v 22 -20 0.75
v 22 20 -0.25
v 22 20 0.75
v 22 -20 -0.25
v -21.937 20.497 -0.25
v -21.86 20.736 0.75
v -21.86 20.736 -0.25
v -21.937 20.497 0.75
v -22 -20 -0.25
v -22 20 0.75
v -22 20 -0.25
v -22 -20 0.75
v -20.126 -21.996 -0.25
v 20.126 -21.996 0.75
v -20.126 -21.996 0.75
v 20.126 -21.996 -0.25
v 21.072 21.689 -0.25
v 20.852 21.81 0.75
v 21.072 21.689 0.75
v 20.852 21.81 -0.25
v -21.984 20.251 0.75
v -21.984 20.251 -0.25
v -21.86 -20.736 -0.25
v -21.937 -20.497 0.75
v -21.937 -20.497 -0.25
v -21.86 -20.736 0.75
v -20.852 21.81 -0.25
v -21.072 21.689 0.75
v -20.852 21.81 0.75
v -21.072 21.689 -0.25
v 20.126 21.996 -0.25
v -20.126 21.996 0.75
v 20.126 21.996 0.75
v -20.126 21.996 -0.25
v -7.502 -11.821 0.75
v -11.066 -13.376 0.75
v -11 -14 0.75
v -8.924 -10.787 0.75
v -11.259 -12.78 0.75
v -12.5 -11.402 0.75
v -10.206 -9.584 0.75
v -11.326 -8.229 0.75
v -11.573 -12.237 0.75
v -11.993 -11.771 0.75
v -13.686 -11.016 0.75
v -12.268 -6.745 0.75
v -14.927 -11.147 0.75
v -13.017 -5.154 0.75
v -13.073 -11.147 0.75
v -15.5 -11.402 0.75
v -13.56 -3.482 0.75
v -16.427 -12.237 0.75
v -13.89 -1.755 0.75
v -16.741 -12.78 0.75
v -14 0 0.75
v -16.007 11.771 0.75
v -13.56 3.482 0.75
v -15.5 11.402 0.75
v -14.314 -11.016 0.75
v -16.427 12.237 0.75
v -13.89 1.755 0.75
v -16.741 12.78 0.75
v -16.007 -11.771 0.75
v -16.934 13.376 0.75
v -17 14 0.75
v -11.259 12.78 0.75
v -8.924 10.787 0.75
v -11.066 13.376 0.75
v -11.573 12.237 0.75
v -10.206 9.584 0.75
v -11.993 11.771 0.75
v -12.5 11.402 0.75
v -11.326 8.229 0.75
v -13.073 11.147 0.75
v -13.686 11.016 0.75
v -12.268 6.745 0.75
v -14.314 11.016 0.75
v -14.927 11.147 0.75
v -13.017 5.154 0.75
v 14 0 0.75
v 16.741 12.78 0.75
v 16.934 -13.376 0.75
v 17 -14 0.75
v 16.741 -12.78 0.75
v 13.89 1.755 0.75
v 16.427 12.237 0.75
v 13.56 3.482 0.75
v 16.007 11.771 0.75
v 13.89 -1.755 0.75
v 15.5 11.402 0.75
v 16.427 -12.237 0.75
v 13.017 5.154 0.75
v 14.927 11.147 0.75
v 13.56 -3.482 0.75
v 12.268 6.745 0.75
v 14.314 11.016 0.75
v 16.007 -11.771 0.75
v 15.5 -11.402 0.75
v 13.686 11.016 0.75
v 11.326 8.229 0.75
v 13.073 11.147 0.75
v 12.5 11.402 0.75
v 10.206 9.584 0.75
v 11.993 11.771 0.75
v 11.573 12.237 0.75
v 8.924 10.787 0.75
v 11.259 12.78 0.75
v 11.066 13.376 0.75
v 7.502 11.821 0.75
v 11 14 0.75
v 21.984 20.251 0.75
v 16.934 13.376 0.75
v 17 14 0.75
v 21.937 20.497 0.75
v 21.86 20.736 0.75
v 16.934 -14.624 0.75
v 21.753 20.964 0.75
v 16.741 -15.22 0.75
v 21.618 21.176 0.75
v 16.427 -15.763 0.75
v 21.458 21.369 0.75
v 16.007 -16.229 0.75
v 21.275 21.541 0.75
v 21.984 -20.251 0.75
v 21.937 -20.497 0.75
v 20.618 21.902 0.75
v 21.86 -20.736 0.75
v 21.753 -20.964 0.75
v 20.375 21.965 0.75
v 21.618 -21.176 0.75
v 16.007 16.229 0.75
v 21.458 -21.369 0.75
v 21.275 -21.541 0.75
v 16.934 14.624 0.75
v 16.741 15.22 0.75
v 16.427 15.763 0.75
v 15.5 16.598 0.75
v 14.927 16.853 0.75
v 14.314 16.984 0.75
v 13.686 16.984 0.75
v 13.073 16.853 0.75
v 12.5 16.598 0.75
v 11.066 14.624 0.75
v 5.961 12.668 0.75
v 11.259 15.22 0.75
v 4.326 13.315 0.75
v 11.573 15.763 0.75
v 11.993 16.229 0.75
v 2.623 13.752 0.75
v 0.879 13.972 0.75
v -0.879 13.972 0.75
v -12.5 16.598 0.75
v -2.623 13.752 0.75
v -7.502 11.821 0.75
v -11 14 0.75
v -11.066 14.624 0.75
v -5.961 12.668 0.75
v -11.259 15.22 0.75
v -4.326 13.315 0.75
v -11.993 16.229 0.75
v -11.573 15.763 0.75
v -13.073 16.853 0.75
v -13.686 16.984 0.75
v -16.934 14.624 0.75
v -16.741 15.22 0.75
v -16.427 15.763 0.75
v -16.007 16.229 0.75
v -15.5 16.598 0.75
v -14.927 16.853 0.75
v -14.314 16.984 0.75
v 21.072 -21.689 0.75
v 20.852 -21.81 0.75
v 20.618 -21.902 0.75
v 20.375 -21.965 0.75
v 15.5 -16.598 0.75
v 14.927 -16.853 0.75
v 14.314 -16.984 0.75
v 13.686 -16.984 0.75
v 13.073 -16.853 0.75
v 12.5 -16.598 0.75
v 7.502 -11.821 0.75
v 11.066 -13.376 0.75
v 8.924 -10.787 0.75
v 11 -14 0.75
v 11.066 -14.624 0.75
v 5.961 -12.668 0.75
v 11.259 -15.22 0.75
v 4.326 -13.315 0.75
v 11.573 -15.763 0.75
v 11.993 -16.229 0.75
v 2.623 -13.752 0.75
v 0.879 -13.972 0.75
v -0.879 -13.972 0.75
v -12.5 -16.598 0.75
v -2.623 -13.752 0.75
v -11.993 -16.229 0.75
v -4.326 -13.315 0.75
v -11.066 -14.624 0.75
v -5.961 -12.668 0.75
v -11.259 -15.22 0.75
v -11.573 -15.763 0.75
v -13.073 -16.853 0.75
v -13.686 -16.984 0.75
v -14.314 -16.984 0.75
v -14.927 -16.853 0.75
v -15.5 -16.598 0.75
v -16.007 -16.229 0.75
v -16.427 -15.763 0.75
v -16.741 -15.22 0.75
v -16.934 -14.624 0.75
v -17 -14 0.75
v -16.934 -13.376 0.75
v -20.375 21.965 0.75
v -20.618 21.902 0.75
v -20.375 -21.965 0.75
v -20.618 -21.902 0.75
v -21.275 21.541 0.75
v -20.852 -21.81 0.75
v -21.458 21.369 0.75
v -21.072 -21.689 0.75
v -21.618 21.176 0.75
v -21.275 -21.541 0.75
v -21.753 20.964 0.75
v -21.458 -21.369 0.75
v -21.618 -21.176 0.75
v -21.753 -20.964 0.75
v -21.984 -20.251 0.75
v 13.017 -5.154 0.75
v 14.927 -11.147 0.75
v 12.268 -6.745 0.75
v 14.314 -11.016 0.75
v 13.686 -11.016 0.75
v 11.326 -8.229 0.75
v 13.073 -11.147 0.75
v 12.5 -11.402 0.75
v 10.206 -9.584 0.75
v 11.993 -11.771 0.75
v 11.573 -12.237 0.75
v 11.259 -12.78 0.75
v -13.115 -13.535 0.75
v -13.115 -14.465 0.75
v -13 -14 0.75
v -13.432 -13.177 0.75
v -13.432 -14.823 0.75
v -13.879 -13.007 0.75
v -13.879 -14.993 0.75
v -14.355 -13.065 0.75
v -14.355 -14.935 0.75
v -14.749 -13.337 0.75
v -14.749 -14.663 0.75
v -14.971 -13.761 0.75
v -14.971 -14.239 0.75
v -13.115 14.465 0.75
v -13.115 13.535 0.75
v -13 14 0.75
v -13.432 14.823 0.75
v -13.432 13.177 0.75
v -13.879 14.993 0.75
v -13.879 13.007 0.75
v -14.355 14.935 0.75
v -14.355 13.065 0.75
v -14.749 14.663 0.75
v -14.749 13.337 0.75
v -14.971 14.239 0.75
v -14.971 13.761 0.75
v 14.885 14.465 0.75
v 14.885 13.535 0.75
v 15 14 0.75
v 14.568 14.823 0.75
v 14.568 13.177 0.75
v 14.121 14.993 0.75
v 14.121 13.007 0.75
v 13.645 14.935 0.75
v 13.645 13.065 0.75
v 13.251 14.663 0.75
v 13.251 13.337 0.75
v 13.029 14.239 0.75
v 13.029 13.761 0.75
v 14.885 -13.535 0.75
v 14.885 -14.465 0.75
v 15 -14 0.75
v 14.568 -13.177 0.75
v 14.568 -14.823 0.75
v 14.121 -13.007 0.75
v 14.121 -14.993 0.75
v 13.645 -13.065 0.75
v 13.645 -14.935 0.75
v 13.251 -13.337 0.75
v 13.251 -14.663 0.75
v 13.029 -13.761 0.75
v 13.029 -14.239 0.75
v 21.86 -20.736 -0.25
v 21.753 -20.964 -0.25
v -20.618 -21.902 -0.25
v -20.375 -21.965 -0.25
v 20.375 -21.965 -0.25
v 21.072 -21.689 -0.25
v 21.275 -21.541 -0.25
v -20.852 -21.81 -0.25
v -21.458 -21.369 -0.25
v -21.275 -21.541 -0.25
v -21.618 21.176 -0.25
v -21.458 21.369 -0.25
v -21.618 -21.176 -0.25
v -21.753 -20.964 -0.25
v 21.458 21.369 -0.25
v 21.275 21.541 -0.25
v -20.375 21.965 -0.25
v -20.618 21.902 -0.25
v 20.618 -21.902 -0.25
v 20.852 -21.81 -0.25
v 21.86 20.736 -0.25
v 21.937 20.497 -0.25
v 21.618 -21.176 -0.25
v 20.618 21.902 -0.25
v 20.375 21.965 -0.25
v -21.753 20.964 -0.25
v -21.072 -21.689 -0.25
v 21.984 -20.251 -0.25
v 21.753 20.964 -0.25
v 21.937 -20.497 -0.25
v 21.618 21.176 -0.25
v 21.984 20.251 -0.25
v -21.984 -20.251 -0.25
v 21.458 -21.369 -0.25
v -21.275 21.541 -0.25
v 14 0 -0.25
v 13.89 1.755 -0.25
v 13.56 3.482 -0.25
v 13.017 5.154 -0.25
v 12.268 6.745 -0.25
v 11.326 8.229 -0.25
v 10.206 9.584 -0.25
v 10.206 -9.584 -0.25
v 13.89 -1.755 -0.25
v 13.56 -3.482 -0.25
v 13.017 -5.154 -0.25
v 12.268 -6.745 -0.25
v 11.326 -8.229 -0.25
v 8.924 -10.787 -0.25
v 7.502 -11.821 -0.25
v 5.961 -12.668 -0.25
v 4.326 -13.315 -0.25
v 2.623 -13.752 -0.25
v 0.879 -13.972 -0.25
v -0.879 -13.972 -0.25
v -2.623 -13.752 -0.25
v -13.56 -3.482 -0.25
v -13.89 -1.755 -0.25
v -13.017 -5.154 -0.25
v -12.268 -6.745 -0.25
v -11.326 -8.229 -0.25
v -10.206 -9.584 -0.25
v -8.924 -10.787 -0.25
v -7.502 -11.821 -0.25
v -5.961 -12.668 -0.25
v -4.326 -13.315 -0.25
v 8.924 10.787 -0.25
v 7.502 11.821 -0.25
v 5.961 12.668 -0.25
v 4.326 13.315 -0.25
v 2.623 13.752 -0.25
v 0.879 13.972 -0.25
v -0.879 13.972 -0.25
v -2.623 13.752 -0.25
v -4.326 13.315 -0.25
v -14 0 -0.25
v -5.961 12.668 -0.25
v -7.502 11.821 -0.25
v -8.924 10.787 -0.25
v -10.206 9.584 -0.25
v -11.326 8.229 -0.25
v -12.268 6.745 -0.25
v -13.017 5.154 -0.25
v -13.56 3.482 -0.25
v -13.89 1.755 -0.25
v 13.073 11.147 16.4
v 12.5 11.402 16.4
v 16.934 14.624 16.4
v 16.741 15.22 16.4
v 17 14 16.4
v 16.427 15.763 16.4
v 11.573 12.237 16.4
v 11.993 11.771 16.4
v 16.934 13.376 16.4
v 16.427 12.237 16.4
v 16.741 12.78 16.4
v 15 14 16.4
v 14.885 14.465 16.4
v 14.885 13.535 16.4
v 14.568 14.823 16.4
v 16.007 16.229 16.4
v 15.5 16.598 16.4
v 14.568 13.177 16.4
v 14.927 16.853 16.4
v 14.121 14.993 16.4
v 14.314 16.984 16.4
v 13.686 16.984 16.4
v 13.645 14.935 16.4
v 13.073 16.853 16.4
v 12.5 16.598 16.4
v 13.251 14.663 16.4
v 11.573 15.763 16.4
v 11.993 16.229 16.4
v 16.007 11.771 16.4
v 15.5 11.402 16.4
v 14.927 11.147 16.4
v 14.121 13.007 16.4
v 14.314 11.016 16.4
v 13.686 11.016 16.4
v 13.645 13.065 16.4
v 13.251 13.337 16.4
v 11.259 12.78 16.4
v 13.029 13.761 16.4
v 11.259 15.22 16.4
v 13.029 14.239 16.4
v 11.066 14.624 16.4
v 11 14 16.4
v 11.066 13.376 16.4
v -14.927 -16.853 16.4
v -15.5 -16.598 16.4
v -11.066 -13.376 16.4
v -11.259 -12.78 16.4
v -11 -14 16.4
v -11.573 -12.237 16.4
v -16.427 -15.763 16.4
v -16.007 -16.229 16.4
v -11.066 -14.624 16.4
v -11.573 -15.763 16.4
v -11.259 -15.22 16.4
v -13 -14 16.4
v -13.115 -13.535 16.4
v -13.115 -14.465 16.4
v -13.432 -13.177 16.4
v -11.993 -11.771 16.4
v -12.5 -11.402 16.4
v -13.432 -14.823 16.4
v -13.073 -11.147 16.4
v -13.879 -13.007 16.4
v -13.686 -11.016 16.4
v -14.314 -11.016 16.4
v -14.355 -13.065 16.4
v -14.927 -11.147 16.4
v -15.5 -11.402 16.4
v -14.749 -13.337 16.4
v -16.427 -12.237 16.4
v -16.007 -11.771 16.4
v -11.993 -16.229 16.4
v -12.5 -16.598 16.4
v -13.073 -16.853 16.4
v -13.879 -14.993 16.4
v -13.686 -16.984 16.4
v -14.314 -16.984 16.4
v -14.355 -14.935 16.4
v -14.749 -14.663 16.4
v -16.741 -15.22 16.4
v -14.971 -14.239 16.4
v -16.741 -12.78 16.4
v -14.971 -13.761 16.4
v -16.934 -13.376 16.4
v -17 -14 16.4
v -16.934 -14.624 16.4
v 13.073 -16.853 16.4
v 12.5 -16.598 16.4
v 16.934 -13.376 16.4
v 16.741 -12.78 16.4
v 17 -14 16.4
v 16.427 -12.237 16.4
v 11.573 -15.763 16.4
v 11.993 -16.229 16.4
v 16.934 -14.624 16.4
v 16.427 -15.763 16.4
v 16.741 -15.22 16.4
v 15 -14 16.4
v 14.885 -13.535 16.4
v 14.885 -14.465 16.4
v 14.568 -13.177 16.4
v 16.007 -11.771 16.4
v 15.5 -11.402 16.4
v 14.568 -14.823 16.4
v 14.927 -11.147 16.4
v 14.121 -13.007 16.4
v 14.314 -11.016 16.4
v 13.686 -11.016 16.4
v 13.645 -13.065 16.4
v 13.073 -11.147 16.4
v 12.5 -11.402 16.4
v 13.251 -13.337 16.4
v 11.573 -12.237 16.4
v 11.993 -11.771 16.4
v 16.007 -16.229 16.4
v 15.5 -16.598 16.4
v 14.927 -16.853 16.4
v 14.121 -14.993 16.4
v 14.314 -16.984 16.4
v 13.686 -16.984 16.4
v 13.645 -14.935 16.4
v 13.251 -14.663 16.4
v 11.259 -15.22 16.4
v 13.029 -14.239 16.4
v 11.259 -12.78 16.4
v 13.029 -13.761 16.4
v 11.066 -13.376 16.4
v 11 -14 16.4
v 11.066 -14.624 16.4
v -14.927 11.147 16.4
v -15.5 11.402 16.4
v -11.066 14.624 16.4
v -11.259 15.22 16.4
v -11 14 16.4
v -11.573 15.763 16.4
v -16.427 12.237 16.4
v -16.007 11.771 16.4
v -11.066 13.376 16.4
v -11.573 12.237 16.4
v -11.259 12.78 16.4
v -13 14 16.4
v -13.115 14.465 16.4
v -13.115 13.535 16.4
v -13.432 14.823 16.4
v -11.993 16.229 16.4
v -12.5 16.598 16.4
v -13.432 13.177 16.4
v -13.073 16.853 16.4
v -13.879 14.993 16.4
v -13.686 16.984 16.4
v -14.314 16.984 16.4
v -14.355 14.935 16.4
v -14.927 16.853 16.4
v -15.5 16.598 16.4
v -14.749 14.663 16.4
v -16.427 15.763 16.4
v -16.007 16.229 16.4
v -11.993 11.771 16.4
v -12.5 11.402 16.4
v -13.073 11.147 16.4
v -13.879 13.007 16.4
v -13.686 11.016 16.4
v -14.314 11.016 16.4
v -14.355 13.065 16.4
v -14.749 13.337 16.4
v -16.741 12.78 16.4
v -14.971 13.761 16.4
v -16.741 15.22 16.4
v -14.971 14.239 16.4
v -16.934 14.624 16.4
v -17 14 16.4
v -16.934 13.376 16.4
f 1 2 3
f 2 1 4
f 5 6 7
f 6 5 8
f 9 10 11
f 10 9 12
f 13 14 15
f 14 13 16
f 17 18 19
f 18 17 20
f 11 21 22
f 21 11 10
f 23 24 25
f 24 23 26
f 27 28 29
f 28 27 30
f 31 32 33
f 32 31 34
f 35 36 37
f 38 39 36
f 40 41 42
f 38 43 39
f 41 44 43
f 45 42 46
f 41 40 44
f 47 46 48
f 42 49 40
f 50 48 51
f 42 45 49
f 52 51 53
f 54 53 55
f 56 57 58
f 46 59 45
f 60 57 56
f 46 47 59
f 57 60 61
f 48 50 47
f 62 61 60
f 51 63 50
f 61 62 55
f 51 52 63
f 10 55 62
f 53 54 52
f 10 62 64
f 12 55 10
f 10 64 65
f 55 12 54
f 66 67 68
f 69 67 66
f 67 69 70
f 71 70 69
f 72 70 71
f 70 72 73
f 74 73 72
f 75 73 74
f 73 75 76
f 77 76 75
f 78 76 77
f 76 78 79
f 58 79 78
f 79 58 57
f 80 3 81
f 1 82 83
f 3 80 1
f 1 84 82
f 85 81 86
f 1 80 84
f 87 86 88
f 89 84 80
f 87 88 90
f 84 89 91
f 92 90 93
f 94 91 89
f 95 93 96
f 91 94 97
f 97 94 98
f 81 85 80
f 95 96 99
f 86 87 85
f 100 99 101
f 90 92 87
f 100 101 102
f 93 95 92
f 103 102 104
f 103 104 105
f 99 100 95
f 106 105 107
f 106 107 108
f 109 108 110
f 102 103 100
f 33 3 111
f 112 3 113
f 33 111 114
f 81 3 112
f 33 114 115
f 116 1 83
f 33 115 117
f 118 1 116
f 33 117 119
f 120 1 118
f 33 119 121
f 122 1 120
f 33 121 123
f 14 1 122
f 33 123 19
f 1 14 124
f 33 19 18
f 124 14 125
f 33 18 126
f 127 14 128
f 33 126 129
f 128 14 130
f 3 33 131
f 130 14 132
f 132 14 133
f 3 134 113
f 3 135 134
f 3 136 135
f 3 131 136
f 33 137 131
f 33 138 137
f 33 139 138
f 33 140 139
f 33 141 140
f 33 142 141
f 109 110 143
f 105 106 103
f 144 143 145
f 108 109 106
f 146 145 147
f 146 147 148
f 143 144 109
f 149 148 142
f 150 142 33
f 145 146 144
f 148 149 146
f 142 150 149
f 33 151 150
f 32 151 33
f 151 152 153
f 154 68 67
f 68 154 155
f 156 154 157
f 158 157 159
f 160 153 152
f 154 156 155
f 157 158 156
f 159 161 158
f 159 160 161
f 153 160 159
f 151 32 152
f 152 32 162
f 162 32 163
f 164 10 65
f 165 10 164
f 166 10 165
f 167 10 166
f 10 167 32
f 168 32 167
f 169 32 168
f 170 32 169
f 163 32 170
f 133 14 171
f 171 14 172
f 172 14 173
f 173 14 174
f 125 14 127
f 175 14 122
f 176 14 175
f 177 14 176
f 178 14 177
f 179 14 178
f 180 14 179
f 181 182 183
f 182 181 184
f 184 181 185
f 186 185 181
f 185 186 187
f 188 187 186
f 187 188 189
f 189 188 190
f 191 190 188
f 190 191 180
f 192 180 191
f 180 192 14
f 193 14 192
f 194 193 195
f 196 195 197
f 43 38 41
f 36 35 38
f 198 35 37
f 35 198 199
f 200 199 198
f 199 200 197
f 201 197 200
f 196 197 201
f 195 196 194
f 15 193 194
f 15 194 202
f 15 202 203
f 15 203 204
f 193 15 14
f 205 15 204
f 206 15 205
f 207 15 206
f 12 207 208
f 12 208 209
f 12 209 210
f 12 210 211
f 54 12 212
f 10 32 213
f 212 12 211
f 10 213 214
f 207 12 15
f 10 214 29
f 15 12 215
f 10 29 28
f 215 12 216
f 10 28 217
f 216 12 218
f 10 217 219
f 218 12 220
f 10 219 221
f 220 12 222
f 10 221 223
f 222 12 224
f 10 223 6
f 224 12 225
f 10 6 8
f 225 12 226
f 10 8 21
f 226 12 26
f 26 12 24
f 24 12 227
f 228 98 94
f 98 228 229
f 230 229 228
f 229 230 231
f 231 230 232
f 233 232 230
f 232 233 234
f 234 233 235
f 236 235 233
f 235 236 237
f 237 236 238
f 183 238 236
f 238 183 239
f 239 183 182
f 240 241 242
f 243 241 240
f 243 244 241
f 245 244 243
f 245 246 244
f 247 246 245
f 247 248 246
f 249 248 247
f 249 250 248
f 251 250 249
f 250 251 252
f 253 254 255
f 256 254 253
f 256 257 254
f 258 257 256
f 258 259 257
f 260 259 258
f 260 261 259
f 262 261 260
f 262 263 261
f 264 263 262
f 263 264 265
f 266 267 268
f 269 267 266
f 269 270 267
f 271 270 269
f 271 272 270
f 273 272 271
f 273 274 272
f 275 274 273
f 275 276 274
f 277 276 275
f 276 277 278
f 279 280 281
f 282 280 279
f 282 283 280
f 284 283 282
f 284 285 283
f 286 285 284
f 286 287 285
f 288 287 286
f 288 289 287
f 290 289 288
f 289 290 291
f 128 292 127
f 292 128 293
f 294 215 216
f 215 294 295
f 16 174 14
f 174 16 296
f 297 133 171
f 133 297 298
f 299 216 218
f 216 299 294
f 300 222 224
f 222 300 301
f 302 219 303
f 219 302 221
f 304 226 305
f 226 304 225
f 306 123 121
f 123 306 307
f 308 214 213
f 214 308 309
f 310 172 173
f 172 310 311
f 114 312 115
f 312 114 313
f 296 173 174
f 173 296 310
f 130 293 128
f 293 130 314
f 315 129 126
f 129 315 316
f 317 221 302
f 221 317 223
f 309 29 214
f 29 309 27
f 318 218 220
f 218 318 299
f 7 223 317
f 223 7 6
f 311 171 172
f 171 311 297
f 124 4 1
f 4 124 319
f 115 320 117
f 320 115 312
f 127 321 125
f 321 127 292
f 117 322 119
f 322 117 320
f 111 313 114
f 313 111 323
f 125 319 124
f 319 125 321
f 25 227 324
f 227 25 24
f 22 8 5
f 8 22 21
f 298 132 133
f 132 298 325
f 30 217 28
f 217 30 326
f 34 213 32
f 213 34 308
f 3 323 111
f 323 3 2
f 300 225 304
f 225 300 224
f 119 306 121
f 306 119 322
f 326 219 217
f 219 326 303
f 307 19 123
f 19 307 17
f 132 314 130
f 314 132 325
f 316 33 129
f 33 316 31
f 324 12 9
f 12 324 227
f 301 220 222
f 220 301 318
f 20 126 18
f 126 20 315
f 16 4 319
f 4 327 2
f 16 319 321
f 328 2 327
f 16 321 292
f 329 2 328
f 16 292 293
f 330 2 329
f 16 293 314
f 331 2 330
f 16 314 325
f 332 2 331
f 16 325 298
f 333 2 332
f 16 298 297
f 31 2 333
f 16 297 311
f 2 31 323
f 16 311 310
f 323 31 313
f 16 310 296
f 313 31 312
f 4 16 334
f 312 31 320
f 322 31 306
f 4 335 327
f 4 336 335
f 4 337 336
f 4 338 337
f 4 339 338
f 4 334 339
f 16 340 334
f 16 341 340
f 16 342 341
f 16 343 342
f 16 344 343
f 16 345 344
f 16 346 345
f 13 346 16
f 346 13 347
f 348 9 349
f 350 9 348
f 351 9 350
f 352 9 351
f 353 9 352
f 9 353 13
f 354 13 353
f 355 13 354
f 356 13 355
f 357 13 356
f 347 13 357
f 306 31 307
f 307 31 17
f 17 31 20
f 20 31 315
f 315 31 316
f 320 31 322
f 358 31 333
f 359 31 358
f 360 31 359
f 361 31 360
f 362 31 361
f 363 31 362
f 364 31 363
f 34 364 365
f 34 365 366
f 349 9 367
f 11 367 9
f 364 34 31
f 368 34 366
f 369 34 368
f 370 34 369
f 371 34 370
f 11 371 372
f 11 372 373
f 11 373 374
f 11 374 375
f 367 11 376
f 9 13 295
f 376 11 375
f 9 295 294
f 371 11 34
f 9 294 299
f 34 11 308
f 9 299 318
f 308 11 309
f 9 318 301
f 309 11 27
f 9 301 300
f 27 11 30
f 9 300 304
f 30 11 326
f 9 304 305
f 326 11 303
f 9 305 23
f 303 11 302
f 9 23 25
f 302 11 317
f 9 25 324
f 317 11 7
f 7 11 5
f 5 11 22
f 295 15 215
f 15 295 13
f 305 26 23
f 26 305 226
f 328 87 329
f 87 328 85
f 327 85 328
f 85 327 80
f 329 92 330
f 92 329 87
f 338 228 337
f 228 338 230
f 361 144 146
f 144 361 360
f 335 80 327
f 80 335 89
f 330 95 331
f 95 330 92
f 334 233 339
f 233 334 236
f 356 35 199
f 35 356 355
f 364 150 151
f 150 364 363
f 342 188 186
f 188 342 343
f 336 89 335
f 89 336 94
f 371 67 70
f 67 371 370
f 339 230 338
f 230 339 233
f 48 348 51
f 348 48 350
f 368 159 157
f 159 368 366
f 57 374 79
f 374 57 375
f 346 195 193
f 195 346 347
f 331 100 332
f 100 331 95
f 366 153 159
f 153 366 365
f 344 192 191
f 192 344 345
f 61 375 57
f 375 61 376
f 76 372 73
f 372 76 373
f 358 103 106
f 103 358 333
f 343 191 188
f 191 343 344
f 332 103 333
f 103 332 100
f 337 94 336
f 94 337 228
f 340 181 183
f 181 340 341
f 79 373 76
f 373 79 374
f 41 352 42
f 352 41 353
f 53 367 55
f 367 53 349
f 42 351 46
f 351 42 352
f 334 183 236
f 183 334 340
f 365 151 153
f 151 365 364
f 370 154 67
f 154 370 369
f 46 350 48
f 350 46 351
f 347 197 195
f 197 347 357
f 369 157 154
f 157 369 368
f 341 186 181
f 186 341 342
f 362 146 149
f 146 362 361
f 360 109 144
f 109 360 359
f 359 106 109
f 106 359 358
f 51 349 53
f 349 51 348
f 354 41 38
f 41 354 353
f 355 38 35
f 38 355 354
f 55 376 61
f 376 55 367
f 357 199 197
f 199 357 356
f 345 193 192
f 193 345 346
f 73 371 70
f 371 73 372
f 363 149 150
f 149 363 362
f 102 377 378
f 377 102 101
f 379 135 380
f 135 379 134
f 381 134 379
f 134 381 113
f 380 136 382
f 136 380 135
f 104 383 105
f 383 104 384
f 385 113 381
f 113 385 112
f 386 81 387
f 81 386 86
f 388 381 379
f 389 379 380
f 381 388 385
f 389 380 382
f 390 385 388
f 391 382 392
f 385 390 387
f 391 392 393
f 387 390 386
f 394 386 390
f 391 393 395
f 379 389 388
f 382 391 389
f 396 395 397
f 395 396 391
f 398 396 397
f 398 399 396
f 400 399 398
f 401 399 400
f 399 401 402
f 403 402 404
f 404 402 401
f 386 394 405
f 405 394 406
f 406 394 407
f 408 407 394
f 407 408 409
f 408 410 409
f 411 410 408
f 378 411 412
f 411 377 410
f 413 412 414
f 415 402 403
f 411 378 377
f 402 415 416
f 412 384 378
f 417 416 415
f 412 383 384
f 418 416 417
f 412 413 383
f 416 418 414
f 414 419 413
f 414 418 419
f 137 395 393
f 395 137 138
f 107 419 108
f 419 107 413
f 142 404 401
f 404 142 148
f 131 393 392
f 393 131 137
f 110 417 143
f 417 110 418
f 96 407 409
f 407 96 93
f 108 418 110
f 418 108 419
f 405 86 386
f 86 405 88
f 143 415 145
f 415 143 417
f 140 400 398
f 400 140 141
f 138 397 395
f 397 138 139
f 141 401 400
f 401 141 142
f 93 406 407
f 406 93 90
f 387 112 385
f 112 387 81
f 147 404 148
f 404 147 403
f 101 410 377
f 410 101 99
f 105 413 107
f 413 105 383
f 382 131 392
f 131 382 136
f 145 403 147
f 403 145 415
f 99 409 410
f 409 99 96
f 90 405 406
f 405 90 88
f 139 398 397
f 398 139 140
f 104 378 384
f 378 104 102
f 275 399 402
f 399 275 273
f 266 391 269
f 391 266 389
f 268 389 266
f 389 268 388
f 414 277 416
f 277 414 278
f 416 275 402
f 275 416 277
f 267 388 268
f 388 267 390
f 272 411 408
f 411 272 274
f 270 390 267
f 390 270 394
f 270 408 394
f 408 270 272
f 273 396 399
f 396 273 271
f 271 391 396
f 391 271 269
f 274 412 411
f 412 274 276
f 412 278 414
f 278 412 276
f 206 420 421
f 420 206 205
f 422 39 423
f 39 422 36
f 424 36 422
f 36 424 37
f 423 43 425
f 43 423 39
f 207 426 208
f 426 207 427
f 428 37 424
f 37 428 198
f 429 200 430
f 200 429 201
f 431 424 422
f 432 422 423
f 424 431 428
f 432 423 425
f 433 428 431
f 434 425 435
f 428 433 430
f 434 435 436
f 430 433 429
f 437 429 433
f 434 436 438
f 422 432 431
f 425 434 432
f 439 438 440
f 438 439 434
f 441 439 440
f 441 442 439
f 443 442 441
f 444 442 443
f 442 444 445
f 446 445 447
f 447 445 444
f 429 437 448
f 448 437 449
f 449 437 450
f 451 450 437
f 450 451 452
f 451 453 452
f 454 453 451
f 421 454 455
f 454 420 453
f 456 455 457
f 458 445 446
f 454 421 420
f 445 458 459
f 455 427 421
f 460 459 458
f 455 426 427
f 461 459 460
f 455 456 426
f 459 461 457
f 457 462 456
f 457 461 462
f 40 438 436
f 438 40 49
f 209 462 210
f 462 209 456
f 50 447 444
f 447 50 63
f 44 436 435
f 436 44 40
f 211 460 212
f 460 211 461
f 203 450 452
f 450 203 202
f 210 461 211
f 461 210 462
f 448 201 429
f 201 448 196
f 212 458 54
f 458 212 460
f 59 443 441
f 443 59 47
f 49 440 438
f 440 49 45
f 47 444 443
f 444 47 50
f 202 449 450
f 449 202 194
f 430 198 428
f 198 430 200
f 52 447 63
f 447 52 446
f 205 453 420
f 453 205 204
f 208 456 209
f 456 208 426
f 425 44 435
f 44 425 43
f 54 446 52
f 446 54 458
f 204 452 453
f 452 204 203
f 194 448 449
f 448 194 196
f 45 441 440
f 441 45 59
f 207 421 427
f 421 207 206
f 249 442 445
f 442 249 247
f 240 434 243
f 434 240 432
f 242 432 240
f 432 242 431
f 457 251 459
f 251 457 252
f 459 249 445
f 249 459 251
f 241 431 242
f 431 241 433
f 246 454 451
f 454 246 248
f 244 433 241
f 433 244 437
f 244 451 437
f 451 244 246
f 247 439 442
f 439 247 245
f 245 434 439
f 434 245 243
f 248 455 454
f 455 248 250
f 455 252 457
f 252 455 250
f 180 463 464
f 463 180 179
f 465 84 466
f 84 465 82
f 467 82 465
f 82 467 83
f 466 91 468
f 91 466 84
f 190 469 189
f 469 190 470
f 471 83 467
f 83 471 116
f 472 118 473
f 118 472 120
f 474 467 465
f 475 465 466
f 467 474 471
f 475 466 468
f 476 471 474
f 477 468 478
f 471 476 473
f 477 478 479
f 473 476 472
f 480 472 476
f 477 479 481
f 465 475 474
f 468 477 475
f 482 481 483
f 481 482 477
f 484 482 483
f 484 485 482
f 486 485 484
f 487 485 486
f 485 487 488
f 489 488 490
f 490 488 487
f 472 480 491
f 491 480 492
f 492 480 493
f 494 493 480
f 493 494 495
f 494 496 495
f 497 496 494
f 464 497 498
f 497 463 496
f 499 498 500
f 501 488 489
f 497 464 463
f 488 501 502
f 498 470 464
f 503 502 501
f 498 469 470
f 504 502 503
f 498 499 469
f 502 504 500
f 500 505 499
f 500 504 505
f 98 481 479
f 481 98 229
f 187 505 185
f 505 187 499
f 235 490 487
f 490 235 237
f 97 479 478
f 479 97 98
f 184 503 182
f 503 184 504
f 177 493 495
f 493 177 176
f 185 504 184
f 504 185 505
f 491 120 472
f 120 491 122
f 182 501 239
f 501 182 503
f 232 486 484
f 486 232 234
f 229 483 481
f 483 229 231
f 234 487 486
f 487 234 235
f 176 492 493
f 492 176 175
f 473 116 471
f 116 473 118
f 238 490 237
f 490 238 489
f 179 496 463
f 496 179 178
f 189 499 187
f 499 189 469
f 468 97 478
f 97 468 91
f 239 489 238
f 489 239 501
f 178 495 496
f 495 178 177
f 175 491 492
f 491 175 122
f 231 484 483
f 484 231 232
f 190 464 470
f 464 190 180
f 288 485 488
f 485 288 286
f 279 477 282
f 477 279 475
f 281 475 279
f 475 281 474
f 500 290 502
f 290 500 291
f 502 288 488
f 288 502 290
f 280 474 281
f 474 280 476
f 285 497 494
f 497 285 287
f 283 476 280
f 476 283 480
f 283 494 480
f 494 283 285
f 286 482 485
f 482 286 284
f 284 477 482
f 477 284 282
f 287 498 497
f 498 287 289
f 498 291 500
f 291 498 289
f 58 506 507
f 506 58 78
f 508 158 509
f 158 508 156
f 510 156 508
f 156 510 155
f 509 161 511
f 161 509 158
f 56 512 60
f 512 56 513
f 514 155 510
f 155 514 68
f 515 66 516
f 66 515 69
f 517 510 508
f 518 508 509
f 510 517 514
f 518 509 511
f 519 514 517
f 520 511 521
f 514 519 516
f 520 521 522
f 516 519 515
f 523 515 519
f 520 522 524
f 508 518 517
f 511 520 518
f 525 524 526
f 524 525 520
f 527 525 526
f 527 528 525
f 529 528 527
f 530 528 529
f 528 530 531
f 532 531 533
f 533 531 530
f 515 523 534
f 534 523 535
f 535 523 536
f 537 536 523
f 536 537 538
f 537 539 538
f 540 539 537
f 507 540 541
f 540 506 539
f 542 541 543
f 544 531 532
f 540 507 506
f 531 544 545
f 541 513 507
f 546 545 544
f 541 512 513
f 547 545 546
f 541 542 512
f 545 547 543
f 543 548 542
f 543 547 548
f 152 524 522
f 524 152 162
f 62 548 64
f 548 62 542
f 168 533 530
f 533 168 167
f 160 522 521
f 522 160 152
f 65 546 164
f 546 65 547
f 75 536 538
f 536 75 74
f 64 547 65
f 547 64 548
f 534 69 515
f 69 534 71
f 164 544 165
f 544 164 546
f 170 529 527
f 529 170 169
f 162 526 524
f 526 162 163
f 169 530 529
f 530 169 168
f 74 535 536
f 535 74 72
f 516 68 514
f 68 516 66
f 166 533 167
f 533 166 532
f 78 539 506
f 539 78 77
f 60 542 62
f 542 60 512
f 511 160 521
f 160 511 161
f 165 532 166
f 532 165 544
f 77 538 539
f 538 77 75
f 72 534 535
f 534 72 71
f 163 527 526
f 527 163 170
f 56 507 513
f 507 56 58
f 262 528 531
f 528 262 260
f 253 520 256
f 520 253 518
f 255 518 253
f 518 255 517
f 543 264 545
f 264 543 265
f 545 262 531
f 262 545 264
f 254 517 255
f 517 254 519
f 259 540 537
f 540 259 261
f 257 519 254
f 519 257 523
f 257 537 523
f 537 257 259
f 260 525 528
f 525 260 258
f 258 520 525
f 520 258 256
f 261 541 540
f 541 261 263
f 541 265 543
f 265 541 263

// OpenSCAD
difference() {
  $fn=50;
  minkowski() {
    cube([40, 40, .5], center=true);
    cylinder(r=2,h=.5);
  }
  translate([0,0,-1]) {
    cylinder(r=14, h=4);
  }
}
  
// cam 1
translate([14, 14, .4]) {
  difference() {
    cylinder(h = 16, r = 3, $fs=.5);
    cylinder(h = 16, r = 1, $fs=.5);
  }
}

translate([-14, -14, .4]) {
  difference() {
    cylinder(h = 16, r = 3, $fs=.5);
    cylinder(h = 16, r = 1, $fs=.5);
  }
}

translate([14, -14, .4]) {
  difference() {
    cylinder(h = 16, r = 3, $fs=.5);
    cylinder(h = 16, r = 1, $fs=.5);
  }
}

translate([-14, 14, .4]) {
  difference() {
    cylinder(h = 16, r = 3, $fs=.5);
    cylinder(h = 16, r = 1, $fs=.5);
  }
}
